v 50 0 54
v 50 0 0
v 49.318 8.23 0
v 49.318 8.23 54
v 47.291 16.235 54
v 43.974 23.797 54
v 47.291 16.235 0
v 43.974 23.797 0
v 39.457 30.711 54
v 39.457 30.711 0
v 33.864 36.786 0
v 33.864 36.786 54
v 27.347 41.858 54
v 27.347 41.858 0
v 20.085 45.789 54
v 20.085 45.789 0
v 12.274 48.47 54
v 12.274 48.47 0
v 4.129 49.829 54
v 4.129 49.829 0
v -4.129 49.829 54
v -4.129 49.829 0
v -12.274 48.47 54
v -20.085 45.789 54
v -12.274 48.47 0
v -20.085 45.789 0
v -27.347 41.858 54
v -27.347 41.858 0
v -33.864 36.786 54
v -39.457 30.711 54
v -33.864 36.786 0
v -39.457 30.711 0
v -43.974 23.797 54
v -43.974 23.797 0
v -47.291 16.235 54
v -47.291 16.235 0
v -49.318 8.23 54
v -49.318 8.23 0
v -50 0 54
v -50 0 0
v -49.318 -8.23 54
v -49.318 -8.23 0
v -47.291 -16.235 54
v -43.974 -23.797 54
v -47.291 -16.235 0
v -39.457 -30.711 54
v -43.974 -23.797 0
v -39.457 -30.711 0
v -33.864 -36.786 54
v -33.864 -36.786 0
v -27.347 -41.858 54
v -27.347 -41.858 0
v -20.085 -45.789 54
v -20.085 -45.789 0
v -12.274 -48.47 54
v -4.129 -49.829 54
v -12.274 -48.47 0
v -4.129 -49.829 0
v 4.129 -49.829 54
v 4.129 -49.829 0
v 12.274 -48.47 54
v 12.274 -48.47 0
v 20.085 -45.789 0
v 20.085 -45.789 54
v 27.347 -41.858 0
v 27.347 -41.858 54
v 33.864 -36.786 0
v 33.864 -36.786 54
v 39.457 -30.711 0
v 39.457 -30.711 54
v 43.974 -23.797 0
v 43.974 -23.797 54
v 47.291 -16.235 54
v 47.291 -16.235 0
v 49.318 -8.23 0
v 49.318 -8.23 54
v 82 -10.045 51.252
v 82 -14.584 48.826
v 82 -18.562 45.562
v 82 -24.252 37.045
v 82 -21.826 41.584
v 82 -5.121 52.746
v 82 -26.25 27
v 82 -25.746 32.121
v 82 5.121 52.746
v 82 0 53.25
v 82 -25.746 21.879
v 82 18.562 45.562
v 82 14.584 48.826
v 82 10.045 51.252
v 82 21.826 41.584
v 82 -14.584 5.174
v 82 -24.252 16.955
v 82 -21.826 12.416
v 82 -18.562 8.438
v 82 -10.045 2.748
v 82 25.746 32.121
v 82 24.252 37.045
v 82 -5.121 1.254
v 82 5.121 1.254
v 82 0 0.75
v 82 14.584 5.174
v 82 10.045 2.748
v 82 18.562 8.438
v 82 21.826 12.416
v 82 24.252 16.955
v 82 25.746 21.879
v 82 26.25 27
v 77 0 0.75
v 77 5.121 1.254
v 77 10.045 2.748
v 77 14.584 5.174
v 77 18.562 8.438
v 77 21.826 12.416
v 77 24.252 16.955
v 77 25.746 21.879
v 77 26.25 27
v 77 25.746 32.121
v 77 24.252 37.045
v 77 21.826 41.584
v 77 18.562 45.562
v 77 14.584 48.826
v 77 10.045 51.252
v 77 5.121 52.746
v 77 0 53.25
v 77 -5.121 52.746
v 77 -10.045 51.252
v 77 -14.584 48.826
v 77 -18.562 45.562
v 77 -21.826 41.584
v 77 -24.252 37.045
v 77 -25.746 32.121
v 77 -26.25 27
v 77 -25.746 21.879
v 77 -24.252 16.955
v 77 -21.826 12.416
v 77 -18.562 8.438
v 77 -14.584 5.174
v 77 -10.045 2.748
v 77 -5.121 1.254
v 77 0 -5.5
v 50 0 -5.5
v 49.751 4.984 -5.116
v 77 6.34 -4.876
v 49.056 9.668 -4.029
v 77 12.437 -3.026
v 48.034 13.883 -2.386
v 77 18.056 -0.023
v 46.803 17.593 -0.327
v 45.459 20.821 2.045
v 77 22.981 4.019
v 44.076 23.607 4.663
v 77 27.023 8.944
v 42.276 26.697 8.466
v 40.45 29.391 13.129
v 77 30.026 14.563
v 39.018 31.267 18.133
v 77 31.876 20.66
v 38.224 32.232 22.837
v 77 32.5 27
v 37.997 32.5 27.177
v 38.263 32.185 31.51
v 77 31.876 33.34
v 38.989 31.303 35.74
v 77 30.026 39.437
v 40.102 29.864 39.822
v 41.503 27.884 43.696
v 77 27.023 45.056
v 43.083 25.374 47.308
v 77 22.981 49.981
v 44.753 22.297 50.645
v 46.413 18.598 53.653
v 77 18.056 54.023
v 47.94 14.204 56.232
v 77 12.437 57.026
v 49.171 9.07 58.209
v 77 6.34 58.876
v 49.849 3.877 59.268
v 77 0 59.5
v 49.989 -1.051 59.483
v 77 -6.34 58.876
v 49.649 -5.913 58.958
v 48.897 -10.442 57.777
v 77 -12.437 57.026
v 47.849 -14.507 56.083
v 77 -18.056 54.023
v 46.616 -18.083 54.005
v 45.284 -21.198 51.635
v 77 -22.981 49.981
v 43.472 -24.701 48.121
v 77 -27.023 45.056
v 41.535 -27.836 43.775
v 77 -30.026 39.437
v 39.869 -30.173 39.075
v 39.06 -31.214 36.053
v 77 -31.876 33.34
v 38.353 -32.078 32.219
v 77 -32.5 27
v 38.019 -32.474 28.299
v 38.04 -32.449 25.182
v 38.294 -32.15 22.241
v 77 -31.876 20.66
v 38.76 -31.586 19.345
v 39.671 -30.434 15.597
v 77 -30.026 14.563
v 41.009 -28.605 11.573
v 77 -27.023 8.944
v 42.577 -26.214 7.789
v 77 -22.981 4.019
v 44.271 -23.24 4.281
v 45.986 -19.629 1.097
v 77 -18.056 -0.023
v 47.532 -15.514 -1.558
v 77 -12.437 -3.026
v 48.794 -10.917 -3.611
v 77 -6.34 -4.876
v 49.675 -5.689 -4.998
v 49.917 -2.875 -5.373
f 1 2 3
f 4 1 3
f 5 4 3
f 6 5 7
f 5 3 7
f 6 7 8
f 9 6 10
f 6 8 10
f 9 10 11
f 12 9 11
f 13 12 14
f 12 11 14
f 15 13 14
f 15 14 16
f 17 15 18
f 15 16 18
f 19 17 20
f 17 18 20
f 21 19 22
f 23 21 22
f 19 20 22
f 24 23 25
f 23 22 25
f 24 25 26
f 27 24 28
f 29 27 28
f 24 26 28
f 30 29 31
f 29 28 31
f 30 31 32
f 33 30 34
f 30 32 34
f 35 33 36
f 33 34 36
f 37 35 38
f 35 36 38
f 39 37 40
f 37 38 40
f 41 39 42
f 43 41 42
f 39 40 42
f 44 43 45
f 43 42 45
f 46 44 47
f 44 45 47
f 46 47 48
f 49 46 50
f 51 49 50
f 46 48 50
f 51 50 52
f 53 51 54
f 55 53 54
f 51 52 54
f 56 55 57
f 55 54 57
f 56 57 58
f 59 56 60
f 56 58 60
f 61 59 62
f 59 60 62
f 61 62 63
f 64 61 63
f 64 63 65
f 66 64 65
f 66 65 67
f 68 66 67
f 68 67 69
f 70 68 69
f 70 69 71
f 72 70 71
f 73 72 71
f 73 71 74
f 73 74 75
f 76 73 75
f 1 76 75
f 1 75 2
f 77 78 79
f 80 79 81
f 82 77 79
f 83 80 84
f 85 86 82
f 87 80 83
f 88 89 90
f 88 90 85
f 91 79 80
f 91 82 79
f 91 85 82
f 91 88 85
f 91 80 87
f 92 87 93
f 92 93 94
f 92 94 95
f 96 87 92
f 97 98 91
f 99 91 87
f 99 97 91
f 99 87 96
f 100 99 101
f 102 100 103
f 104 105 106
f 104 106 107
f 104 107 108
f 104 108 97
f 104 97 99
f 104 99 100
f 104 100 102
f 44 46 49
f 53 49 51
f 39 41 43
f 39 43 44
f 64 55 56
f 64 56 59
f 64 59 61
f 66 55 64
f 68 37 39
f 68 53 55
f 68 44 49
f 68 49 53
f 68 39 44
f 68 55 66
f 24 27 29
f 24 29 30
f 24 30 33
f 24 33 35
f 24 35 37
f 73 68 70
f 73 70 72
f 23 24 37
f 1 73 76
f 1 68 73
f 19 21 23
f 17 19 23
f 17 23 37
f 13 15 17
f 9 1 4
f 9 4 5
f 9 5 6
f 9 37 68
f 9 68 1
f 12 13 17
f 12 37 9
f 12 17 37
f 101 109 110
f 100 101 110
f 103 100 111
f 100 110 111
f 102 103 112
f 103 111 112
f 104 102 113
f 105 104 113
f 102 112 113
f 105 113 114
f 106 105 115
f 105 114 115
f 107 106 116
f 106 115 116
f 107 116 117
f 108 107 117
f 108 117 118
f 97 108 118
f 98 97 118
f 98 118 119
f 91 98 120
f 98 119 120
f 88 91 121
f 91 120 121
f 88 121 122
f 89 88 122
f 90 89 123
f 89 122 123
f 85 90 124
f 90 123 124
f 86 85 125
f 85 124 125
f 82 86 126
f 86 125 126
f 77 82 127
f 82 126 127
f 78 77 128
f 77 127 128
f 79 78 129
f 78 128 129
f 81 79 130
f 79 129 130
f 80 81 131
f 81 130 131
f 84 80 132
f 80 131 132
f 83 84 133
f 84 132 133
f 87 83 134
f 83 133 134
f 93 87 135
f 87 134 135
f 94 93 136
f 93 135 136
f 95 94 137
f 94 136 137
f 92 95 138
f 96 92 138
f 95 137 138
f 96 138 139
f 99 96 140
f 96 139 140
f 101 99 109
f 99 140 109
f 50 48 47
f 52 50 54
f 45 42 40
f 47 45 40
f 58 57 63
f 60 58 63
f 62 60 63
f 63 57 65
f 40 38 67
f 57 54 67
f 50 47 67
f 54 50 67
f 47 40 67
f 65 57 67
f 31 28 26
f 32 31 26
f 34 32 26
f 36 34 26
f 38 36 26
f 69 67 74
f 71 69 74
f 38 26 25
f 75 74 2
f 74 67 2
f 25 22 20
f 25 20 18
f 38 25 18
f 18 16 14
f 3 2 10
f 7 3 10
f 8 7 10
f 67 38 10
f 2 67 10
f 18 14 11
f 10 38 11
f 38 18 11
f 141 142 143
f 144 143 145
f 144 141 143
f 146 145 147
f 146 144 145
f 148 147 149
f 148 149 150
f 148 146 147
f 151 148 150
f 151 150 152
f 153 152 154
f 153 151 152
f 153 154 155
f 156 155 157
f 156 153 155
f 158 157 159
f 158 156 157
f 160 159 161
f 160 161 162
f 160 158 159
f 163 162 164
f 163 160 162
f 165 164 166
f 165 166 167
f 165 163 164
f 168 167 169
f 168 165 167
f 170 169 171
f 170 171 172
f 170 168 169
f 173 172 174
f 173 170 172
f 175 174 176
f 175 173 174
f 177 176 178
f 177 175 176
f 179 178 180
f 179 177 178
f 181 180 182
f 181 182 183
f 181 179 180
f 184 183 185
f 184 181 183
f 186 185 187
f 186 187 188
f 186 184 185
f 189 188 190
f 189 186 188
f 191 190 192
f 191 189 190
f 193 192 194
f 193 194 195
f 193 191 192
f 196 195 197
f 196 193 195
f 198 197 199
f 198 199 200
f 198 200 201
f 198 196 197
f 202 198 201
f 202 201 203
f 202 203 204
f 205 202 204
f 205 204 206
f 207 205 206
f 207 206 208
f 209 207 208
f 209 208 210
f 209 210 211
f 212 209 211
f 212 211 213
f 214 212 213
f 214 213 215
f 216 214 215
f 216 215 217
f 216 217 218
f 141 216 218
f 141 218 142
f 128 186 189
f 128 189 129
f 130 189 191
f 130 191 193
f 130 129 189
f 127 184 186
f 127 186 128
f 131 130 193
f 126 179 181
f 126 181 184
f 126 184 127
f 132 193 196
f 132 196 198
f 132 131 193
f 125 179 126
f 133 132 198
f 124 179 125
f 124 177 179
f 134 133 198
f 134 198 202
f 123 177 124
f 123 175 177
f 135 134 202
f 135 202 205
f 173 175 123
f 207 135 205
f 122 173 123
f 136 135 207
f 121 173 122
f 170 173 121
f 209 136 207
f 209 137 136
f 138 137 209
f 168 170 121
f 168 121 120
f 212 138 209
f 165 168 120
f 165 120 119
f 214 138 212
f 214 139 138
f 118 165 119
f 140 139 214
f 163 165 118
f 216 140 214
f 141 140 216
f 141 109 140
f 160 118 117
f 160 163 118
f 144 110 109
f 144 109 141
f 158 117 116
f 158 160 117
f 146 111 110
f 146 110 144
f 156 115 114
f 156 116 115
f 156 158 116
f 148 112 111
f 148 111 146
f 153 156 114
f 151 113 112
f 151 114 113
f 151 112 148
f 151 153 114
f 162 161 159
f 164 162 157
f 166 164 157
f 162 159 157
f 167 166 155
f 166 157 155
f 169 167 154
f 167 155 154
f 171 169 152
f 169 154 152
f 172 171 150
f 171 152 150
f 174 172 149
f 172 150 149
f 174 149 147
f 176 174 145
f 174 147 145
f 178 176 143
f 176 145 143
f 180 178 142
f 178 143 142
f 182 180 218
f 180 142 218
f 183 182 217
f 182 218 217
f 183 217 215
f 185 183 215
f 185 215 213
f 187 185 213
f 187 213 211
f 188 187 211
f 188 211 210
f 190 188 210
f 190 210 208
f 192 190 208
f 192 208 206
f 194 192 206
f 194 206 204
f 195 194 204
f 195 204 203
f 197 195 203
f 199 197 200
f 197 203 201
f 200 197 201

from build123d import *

# Parameters (mm, degrees)
SKETCH1_R                = 50
BOSS_EXTRUDE1_DEPTH      = 54
BOSS_EXTRUDE2_REACH      = 148.782
BOSS_EXTRUDE2_END_RADIUS = 50
SKETCH2_R                = 32.5
SKETCH3_R                = 26.25
BOSS_EXTRUDE3_DEPTH      = 5


with BuildPart() as part:
    # Sketch1 → Boss-Extrude1 (new body)
    with BuildSketch(Plane.XY):
        Circle(SKETCH1_R)
    extrude(amount=BOSS_EXTRUDE1_DEPTH)


with BuildPart() as body_2:
    # Boss-Extrude2: up to this cylinder (the profile starts outside it)
    boss_extrude2_end = Plane(origin=(0, 0, 27), z_dir=(0, 0, -1)) * Cylinder(BOSS_EXTRUDE2_END_RADIUS, 398.564, mode=Mode.PRIVATE)
    # Sketch2 → Boss-Extrude2 (new, up to the surface)
    with BuildSketch(Plane(origin=(77, 0, 0), x_dir=(0, 0, -1), z_dir=(1, 0, 0)), mode=Mode.PRIVATE) as boss_extrude2_sk1:
        with Locations((-27, 0)):
            Circle(SKETCH2_R)
    boss_extrude2_tool1 = extrude(boss_extrude2_sk1.sketch, amount=-BOSS_EXTRUDE2_REACH, mode=Mode.PRIVATE) - boss_extrude2_end
    add(boss_extrude2_tool1.solids().sort_by_distance((77, 0, 27))[0])

    # Sketch3 → Boss-Extrude3 (add)
    with BuildSketch(Plane(origin=(77, 0, 0), x_dir=(0, 0, -1), z_dir=(1, 0, 0))):
        with Locations((-27, 0)):
            Circle(SKETCH3_R)
    extrude(amount=BOSS_EXTRUDE3_DEPTH)


solid = Compound([part.part, body_2.part])
